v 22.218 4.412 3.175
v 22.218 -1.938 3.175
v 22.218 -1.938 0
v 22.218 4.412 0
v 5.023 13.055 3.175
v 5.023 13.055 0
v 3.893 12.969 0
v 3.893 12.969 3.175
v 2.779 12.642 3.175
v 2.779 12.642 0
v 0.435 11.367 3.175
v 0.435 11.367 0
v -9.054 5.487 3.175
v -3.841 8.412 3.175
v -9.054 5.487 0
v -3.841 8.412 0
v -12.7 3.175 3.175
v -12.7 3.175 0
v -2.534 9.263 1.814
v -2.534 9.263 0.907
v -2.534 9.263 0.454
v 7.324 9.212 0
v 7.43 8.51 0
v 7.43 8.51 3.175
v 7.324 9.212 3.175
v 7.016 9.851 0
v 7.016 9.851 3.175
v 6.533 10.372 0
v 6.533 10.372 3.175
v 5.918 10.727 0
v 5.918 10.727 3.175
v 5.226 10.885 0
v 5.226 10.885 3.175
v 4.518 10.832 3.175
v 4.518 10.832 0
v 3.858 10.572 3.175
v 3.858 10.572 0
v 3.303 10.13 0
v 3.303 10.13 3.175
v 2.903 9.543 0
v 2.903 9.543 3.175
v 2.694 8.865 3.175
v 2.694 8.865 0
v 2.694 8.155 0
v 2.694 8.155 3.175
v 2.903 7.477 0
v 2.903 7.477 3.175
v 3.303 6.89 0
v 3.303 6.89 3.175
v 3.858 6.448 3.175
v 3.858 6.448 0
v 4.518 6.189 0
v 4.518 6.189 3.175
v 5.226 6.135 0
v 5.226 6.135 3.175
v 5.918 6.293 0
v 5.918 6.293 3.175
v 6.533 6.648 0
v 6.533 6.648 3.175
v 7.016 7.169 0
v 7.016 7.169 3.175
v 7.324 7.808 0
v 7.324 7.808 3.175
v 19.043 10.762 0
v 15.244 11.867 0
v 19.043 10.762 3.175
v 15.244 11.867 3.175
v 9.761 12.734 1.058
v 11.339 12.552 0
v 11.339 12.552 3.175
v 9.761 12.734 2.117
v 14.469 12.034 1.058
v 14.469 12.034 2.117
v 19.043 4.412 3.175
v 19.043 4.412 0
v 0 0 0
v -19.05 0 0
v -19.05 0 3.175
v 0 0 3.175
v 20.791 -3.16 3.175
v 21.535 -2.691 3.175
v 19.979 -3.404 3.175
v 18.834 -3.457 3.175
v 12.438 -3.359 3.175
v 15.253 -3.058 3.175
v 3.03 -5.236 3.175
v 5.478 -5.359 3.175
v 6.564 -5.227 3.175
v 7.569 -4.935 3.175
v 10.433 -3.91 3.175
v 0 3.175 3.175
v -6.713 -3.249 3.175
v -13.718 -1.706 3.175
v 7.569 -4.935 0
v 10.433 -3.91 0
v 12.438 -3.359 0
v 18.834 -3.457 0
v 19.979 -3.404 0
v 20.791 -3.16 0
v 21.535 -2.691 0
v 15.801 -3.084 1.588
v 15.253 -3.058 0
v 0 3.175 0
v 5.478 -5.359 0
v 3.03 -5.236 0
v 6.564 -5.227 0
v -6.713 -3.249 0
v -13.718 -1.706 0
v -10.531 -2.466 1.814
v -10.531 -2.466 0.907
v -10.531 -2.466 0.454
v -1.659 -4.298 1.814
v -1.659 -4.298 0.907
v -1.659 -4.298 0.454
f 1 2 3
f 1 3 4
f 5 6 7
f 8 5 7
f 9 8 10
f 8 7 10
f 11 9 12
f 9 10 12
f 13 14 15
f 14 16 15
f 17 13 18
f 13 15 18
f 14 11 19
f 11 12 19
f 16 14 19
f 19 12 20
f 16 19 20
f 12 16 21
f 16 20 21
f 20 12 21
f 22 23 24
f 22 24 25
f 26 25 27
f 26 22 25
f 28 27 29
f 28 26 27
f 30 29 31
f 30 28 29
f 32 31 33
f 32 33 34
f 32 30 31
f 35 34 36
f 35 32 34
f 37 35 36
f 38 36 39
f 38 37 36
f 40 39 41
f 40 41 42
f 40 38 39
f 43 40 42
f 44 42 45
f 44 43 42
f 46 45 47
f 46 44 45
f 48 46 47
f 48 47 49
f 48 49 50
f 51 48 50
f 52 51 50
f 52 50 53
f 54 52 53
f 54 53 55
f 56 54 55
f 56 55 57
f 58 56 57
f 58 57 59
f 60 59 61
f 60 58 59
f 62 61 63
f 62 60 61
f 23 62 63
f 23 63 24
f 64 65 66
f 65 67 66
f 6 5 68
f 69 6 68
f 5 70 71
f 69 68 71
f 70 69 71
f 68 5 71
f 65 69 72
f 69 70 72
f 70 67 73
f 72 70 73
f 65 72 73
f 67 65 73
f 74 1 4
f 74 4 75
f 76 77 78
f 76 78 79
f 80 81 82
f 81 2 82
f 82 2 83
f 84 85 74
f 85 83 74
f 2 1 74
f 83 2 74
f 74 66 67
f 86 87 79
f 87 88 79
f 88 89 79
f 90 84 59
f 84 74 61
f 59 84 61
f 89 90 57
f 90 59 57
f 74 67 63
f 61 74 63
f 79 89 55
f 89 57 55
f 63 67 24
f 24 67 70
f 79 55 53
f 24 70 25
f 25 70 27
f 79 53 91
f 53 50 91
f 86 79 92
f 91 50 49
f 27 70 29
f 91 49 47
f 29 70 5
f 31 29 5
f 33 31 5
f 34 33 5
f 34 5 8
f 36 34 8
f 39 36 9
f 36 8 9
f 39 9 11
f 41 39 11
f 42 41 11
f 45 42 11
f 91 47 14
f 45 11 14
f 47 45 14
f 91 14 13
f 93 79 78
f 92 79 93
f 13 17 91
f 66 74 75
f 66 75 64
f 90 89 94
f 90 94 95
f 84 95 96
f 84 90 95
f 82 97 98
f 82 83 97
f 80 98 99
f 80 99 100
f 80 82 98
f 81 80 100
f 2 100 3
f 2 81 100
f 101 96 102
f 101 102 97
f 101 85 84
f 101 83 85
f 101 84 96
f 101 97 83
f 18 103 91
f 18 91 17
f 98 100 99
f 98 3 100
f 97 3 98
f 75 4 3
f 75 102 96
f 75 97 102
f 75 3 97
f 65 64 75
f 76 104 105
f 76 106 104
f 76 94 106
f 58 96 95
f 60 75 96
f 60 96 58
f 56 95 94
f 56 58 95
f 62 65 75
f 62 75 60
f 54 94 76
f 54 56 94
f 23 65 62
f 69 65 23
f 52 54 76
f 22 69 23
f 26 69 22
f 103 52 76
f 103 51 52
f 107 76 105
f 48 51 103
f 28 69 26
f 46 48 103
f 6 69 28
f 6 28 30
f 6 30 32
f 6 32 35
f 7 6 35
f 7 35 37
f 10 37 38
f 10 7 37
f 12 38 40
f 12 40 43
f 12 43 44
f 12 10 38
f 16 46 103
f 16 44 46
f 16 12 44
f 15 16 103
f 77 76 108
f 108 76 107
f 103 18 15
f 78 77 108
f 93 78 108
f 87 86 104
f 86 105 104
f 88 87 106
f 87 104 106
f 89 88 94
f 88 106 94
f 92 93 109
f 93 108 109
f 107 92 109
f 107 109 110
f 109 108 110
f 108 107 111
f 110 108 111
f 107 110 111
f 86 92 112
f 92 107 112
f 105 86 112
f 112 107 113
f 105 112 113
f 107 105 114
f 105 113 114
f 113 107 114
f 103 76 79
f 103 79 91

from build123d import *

# Parameters (mm, degrees)
SKETCH1_R           = 2.38125
BOSS_EXTRUDE1_DEPTH = 3.175
BOSS_EXTRUDE2_DEPTH = 3.175


with BuildPart() as part:
    # Sketch1 → Boss-Extrude1 (new body)
    with BuildSketch(Plane.XY):
        with BuildLine():
            Line((-19.05, 0), (0, 0))
            Line((0, 0), (0, 3.175))
            Line((0, 3.175), (-12.7, 3.175))
            add(Edge.make_bspline(
                [(-19.05, 0), (-13.112033971, -2.27730223), (-5.155795632, -3.204594962), (8.217288269, -6.774378233), (12.030948412, 0.931903495), (12.931224231, 8.259301282), (4.816413804, 15.369954974), (-3.592277072, 7.785567441), (-9.215384474, 5.719027598), (-12.7, 3.175)],
                knots=[0, 0, 0, 0, 0.256909303, 0.405237787, 0.477393103, 0.59131784, 0.708774719, 0.830232282, 1, 1, 1, 1], degree=3))
        make_face()
        with Locations((5.048367475, 8.51005191)):
            Circle(SKETCH1_R, mode=Mode.SUBTRACT)
    extrude(amount=BOSS_EXTRUDE1_DEPTH)

    # Sketch2 → Boss-Extrude2 (add)
    with BuildSketch(Plane.XY.offset(3.175)):
        with BuildLine():
            add(Edge.make_bspline(
                [(4.988150959, 13.056659727), (9.718743656, 12.859855216), (14.559374774, 12.389270948), (19.04312554, 10.761627981)],
                knots=[0, 0, 0, 0, 1, 1, 1, 1], degree=3))
            Line((4.988150959, 13.056659727), (8.479749464, 10.133745789))
            Line((8.479749464, 10.133745789), (7.569273367, -4.93526217))
            add(Edge.make_bspline(
                [(7.569273367, -4.93526217), (10.177388397, -3.973098163), (15.151025201, -1.968746735), (20.532585299, -4.307476576), (22.21812554, -1.938372019)],
                knots=[0, 0, 0, 0, 0.552836204, 1, 1, 1, 1], degree=3))
            Line((22.21812554, -1.938372019), (9.51812554, -1.938372019))
            Line((9.51812554, -1.938372019), (9.51812554, 10.761627981))
            Line((9.51812554, 10.761627981), (19.04312554, 10.761627981))
        make_face()
        Polygon((19.04312554, 4.411627981), (19.04312554, 10.761627981), (9.51812554, 10.761627981), (9.51812554, -1.938372019), (22.21812554, -1.938372019), (22.21812554, 4.411627981), align=None)
    extrude(amount=-BOSS_EXTRUDE2_DEPTH)


solid = part.part
